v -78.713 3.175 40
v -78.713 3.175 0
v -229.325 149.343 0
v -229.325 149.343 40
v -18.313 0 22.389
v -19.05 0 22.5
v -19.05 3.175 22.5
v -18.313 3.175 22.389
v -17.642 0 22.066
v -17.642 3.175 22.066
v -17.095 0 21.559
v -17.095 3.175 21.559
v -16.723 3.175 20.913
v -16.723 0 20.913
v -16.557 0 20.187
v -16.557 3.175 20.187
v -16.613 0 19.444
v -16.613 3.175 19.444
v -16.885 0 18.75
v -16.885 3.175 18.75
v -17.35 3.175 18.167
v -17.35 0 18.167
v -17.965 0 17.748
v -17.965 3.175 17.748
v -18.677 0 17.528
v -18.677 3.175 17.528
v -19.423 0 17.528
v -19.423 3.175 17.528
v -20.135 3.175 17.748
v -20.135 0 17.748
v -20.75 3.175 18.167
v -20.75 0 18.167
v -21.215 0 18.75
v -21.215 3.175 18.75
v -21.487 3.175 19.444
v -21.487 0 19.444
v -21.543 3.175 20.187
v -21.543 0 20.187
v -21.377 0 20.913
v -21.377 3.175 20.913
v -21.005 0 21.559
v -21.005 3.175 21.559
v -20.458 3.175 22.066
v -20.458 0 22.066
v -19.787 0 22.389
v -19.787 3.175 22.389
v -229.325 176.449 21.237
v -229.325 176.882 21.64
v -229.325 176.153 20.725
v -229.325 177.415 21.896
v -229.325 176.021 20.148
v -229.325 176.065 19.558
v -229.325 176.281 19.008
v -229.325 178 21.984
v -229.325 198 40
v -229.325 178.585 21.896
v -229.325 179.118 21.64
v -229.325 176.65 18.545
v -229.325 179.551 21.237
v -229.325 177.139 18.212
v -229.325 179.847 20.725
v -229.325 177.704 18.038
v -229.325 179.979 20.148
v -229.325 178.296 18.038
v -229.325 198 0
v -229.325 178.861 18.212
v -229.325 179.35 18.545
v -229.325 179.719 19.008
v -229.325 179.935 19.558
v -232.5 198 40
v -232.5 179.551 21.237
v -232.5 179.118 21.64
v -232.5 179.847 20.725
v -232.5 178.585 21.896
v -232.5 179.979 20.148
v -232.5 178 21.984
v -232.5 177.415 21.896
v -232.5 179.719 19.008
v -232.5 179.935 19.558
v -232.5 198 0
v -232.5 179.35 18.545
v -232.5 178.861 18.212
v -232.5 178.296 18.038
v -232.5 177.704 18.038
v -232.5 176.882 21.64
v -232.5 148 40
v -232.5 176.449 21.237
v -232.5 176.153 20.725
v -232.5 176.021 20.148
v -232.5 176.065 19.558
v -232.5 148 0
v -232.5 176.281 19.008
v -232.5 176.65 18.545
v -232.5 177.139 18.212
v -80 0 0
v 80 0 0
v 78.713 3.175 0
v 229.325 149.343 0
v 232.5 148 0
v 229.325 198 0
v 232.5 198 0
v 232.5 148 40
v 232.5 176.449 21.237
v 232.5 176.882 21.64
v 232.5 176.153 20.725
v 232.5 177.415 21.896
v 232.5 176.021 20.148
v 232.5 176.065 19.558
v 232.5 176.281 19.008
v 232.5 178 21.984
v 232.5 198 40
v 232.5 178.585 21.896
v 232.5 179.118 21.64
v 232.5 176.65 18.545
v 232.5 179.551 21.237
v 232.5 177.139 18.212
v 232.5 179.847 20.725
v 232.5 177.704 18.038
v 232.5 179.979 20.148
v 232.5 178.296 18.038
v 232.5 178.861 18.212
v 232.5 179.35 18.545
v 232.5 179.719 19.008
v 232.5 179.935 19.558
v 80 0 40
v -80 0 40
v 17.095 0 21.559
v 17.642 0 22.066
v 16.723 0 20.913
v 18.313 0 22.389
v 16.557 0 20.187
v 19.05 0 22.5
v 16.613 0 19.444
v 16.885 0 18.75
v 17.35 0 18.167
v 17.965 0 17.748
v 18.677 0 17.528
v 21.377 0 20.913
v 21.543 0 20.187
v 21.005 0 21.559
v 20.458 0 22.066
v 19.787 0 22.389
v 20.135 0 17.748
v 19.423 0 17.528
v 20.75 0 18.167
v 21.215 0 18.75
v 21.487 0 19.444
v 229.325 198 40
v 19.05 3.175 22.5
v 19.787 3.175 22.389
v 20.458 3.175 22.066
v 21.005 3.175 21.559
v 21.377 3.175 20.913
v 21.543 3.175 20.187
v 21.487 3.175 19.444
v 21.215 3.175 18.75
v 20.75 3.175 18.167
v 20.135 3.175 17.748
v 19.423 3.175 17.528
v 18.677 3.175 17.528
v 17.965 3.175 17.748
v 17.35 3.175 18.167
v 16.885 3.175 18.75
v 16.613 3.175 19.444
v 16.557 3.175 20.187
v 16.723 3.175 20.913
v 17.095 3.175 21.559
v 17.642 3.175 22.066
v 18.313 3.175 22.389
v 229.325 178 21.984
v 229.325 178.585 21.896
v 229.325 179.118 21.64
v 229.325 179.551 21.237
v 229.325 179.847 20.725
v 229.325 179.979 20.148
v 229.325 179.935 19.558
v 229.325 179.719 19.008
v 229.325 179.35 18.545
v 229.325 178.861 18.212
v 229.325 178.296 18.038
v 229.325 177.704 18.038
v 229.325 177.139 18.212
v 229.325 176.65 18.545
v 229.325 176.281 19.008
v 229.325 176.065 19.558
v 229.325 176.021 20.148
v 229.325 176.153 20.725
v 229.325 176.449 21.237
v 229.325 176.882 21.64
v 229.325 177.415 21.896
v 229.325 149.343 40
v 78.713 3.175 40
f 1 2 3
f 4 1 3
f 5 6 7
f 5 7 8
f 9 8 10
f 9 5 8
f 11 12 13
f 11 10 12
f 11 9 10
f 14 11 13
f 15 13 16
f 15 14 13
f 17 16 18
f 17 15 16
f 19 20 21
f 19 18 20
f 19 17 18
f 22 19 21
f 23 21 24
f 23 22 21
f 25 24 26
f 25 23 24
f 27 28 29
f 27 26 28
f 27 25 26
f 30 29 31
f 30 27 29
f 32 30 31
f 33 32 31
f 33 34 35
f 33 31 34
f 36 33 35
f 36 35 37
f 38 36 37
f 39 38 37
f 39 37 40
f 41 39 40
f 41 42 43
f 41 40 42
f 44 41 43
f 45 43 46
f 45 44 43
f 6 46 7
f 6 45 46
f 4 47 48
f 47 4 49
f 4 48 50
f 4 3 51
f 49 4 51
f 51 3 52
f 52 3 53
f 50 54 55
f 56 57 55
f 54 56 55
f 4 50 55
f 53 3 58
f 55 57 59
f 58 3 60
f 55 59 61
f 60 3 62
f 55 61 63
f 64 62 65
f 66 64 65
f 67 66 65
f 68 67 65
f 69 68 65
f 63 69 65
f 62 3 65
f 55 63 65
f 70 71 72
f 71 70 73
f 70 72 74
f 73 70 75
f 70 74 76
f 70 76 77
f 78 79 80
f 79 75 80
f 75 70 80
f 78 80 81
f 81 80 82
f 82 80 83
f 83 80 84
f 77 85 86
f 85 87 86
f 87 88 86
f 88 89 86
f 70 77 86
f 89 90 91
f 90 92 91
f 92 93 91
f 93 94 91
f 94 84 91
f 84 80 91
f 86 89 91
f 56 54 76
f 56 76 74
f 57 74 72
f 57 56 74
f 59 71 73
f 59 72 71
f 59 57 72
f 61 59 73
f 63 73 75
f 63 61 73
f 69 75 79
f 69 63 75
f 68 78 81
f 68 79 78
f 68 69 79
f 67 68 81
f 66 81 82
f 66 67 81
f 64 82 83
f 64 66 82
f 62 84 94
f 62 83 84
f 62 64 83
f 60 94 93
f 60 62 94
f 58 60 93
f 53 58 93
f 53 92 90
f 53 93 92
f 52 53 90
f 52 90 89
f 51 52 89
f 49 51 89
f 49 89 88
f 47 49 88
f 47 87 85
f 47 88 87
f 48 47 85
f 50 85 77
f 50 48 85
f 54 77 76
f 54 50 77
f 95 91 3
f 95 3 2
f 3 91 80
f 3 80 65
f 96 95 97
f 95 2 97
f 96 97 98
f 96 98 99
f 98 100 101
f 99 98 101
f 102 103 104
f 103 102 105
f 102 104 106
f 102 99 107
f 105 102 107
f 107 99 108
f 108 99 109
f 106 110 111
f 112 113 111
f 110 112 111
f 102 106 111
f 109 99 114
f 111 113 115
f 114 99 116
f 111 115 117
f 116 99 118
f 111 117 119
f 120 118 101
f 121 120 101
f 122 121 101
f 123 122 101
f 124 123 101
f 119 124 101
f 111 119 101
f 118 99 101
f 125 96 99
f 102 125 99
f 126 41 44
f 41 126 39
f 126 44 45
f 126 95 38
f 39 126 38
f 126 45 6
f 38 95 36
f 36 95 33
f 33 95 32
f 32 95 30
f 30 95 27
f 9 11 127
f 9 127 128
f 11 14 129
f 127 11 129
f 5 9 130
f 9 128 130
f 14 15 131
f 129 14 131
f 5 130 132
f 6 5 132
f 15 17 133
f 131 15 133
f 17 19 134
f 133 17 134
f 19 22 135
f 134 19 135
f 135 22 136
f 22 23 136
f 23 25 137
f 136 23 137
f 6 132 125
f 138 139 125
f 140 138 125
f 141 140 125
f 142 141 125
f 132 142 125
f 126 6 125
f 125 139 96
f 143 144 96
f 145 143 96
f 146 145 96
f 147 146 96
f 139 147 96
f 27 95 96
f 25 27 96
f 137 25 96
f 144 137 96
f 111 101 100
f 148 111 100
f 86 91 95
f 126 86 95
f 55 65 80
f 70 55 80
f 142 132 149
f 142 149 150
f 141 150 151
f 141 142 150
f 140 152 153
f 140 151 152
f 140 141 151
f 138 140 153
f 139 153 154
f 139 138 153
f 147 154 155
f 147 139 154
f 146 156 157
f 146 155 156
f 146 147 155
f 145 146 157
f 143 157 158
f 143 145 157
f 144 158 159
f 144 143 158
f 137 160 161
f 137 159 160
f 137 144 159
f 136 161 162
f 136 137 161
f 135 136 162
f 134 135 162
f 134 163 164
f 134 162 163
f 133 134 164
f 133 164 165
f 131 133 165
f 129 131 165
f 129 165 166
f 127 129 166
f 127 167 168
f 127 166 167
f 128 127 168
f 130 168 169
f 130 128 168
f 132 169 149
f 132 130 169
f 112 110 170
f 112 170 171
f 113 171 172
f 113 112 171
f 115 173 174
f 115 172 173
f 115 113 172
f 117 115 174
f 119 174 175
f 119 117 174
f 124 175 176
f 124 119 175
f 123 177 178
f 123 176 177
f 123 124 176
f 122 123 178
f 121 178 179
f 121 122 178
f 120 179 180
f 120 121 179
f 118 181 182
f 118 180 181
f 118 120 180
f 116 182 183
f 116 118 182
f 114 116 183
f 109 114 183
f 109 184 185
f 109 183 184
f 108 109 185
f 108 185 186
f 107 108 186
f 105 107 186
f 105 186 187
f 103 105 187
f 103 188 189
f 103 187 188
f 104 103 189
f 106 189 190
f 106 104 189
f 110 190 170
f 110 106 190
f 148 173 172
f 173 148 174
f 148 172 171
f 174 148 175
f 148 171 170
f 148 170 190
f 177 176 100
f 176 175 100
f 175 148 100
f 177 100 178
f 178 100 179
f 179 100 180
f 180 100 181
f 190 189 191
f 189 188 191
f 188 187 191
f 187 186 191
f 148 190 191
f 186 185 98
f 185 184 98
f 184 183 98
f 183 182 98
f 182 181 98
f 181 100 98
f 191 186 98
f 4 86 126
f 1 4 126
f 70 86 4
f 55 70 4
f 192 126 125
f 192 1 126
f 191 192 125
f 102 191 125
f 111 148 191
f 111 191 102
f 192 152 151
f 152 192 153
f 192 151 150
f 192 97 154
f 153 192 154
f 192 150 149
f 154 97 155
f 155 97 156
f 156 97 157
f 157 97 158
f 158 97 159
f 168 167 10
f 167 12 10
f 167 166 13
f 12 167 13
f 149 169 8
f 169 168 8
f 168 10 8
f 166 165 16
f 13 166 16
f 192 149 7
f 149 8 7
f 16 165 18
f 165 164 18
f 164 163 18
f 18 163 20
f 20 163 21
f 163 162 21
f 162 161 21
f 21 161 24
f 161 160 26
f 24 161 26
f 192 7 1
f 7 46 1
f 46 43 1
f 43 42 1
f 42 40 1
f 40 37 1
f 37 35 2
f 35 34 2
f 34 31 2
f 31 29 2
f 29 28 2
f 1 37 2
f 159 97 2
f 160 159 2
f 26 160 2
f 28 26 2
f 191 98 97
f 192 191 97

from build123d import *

# Parameters (mm, degrees)
BOSS_EXTRUDE1_DEPTH     = 40
CUT_EXTRUDE1_DEPTH      = 306.96246604
CUT_EXTRUDE1_DEPTH_BACK = 306.96246604
SKETCH3_R               = 2.5
CUT_EXTRUDE2_DEPTH      = 507.98027575
CUT_EXTRUDE2_DEPTH_BACK = 507.98027575
SKETCH4_R               = 1.984375


with BuildPart() as part:
    # Sketch1 → Boss-Extrude1 (new body)
    with BuildSketch(Plane.XY):
        Polygon((-80, 0), (80, 0), (232.5, 148), (232.5, 198), (229.325, 198), (229.325, 149.343064798), (78.712635935, 3.175), (-78.712635935, 3.175), (-229.325, 149.343064798), (-229.325, 198), (-232.5, 198), (-232.5, 148), align=None)
    extrude(amount=BOSS_EXTRUDE1_DEPTH)

    # Sketch3 → Cut-Extrude1 (cut, two sides: drawn at the far end of the back side and taken through both)
    with BuildSketch(Plane(origin=(0, 3.175, 0), x_dir=(1, 0, 0), z_dir=(0, 1, 0)).offset(-CUT_EXTRUDE1_DEPTH_BACK)):
        with Locations(Location((-19.05, -20, 0), (0, 0, 270))):
            Circle(SKETCH3_R)
        with Locations(Location((19.05, -20, 0), (0, 0, 270))):
            Circle(SKETCH3_R)
    extrude(amount=CUT_EXTRUDE1_DEPTH + CUT_EXTRUDE1_DEPTH_BACK, mode=Mode.SUBTRACT)

    # Sketch4 → Cut-Extrude2 (cut, two sides: drawn at the far end of the back side and taken through both)
    with BuildSketch(Plane.ZY.offset(232.5).offset(-CUT_EXTRUDE2_DEPTH_BACK)):
        with Locations((20, 178)):
            Circle(SKETCH4_R)
    extrude(amount=CUT_EXTRUDE2_DEPTH + CUT_EXTRUDE2_DEPTH_BACK, mode=Mode.SUBTRACT)


solid = part.part
